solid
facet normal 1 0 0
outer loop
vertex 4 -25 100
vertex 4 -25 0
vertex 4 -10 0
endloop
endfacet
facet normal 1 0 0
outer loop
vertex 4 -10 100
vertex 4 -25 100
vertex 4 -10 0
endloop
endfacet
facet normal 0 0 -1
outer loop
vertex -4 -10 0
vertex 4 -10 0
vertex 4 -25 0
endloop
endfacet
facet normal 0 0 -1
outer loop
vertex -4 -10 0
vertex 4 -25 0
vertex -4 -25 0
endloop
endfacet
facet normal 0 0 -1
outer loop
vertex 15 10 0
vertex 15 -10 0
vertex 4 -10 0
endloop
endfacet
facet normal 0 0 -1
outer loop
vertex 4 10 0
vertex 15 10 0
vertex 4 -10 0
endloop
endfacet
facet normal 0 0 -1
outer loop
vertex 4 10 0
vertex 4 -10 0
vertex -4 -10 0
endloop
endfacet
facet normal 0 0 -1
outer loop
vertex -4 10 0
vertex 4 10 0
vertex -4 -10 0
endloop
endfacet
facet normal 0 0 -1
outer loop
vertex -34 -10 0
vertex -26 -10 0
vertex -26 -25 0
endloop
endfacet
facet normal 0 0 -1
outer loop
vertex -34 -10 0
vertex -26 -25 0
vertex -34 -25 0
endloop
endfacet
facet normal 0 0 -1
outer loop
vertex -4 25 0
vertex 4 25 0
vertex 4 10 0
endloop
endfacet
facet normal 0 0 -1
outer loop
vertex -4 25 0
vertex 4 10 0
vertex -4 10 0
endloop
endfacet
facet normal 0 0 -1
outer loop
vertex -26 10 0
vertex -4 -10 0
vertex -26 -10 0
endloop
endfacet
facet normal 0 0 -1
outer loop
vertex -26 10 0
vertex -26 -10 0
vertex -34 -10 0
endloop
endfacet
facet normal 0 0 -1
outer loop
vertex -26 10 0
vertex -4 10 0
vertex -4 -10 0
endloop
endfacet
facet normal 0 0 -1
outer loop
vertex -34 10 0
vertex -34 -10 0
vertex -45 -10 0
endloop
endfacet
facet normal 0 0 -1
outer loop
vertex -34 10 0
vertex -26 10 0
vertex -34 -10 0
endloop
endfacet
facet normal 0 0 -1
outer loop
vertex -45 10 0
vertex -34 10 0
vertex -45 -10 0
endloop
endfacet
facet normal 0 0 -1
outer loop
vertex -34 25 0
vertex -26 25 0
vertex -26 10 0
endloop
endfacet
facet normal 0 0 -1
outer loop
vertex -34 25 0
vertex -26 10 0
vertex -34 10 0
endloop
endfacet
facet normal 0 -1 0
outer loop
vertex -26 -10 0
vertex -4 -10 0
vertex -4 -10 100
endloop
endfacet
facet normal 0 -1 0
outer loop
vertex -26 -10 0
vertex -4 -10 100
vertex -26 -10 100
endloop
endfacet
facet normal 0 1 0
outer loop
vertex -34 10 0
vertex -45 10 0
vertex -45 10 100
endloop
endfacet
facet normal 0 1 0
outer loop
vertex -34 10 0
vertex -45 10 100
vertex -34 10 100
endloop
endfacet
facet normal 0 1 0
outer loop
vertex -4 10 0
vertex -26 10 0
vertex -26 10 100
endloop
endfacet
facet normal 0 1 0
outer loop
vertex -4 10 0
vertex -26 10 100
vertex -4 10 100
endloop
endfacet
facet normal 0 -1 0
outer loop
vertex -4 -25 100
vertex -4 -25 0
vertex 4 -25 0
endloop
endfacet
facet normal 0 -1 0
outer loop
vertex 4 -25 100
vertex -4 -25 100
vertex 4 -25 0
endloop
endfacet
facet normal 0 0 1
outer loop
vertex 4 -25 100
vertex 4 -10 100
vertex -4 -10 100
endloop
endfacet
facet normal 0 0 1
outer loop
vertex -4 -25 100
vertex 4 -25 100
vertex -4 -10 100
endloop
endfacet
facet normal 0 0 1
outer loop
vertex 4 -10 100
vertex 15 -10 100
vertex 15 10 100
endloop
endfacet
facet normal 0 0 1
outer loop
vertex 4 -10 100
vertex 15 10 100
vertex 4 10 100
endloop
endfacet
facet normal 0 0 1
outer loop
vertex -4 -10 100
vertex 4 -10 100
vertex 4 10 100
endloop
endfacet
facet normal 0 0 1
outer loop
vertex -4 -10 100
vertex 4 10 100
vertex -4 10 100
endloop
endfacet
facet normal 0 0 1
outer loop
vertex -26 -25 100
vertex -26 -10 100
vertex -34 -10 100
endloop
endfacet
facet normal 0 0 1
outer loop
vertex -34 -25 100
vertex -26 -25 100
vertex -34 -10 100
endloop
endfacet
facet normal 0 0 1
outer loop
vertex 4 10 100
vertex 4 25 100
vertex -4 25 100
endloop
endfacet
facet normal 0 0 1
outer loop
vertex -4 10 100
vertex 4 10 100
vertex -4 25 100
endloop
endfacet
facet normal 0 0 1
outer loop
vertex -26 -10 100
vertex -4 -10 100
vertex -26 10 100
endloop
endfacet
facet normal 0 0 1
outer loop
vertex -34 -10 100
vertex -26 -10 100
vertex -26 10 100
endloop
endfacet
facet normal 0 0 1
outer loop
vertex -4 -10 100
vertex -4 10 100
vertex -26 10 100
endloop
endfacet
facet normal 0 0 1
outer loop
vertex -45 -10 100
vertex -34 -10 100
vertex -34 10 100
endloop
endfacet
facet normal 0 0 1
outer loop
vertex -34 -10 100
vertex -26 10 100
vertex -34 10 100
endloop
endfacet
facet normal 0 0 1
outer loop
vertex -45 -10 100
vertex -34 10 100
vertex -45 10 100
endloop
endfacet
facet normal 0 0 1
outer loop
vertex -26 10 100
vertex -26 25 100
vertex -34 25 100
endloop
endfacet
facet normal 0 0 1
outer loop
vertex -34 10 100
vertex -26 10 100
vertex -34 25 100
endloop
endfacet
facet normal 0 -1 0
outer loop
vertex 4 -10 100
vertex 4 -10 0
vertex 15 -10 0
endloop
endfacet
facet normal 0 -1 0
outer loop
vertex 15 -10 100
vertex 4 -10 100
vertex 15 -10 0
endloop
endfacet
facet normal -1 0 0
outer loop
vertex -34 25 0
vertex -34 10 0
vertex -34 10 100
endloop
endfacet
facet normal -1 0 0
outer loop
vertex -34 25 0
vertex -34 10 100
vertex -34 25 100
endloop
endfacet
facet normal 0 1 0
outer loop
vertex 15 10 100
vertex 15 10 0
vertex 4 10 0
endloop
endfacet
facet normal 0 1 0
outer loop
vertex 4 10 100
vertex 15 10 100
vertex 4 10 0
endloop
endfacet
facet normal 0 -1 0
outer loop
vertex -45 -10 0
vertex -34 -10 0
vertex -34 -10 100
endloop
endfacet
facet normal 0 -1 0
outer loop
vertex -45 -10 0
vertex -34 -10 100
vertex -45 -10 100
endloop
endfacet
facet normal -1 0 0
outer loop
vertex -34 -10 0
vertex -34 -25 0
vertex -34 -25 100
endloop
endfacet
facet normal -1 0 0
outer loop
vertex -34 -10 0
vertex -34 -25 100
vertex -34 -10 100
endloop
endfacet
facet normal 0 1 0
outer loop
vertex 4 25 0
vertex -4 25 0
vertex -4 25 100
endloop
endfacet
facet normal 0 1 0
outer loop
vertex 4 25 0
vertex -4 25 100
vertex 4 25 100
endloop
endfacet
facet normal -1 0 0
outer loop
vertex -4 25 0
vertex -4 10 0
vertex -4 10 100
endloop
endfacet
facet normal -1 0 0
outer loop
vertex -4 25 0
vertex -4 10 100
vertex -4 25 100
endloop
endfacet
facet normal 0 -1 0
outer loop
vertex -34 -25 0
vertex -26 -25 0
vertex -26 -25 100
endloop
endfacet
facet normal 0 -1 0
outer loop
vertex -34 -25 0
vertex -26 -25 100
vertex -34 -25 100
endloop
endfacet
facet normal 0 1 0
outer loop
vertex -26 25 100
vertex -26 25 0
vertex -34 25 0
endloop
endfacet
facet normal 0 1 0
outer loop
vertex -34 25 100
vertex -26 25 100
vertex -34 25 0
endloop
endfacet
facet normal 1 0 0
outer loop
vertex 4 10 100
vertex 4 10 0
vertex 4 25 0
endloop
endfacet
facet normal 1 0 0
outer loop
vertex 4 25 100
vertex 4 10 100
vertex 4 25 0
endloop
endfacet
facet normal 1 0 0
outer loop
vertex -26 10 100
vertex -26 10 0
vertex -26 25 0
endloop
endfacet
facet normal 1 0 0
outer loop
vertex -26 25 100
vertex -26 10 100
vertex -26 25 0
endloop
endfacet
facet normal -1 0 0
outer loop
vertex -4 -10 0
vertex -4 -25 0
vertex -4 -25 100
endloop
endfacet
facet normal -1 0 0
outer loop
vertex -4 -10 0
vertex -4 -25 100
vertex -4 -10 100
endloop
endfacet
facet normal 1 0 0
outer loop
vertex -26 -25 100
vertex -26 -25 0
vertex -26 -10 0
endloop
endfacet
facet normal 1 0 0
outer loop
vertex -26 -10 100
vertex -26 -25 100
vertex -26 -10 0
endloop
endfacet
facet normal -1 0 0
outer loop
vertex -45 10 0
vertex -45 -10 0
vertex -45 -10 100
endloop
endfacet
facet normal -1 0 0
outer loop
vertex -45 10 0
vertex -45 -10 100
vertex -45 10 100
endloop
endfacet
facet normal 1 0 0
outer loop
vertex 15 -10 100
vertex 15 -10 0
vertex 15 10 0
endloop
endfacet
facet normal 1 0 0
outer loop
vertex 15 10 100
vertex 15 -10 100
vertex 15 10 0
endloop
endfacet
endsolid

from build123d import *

# Parameters (mm, degrees)
SKETCH_1_W      = 11
SKETCH_1_H      = 20
SKETCH_1_W_2    = 8
SKETCH_1_H_2    = 15
EXTRUDE_1_DEPTH = 100


with BuildPart() as part:
    # Эскиз1 → Бобышка-Вытянуть1 (new body)
    with BuildSketch(Plane.XY):
        with Locations((9.5, 0)):
            Rectangle(SKETCH_1_W, SKETCH_1_H)
        Rectangle(SKETCH_1_W_2, SKETCH_1_H)
        with Locations((-9.5, 0)):
            Rectangle(SKETCH_1_W, SKETCH_1_H)
        with Locations((0, 17.5)):
            Rectangle(SKETCH_1_W_2, SKETCH_1_H_2)
        with Locations((0, -17.5)):
            Rectangle(SKETCH_1_W_2, SKETCH_1_H_2)
    extrude_1 = extrude(amount=EXTRUDE_1_DEPTH)

    # Зеркальное отражение1: Бобышка-Вытянуть1 across plane
    add(extrude_1.mirror(Plane(origin=(-15, 0, 100), x_dir=(0, 0, 1), z_dir=(-1, 0, 0))))


solid = part.part
